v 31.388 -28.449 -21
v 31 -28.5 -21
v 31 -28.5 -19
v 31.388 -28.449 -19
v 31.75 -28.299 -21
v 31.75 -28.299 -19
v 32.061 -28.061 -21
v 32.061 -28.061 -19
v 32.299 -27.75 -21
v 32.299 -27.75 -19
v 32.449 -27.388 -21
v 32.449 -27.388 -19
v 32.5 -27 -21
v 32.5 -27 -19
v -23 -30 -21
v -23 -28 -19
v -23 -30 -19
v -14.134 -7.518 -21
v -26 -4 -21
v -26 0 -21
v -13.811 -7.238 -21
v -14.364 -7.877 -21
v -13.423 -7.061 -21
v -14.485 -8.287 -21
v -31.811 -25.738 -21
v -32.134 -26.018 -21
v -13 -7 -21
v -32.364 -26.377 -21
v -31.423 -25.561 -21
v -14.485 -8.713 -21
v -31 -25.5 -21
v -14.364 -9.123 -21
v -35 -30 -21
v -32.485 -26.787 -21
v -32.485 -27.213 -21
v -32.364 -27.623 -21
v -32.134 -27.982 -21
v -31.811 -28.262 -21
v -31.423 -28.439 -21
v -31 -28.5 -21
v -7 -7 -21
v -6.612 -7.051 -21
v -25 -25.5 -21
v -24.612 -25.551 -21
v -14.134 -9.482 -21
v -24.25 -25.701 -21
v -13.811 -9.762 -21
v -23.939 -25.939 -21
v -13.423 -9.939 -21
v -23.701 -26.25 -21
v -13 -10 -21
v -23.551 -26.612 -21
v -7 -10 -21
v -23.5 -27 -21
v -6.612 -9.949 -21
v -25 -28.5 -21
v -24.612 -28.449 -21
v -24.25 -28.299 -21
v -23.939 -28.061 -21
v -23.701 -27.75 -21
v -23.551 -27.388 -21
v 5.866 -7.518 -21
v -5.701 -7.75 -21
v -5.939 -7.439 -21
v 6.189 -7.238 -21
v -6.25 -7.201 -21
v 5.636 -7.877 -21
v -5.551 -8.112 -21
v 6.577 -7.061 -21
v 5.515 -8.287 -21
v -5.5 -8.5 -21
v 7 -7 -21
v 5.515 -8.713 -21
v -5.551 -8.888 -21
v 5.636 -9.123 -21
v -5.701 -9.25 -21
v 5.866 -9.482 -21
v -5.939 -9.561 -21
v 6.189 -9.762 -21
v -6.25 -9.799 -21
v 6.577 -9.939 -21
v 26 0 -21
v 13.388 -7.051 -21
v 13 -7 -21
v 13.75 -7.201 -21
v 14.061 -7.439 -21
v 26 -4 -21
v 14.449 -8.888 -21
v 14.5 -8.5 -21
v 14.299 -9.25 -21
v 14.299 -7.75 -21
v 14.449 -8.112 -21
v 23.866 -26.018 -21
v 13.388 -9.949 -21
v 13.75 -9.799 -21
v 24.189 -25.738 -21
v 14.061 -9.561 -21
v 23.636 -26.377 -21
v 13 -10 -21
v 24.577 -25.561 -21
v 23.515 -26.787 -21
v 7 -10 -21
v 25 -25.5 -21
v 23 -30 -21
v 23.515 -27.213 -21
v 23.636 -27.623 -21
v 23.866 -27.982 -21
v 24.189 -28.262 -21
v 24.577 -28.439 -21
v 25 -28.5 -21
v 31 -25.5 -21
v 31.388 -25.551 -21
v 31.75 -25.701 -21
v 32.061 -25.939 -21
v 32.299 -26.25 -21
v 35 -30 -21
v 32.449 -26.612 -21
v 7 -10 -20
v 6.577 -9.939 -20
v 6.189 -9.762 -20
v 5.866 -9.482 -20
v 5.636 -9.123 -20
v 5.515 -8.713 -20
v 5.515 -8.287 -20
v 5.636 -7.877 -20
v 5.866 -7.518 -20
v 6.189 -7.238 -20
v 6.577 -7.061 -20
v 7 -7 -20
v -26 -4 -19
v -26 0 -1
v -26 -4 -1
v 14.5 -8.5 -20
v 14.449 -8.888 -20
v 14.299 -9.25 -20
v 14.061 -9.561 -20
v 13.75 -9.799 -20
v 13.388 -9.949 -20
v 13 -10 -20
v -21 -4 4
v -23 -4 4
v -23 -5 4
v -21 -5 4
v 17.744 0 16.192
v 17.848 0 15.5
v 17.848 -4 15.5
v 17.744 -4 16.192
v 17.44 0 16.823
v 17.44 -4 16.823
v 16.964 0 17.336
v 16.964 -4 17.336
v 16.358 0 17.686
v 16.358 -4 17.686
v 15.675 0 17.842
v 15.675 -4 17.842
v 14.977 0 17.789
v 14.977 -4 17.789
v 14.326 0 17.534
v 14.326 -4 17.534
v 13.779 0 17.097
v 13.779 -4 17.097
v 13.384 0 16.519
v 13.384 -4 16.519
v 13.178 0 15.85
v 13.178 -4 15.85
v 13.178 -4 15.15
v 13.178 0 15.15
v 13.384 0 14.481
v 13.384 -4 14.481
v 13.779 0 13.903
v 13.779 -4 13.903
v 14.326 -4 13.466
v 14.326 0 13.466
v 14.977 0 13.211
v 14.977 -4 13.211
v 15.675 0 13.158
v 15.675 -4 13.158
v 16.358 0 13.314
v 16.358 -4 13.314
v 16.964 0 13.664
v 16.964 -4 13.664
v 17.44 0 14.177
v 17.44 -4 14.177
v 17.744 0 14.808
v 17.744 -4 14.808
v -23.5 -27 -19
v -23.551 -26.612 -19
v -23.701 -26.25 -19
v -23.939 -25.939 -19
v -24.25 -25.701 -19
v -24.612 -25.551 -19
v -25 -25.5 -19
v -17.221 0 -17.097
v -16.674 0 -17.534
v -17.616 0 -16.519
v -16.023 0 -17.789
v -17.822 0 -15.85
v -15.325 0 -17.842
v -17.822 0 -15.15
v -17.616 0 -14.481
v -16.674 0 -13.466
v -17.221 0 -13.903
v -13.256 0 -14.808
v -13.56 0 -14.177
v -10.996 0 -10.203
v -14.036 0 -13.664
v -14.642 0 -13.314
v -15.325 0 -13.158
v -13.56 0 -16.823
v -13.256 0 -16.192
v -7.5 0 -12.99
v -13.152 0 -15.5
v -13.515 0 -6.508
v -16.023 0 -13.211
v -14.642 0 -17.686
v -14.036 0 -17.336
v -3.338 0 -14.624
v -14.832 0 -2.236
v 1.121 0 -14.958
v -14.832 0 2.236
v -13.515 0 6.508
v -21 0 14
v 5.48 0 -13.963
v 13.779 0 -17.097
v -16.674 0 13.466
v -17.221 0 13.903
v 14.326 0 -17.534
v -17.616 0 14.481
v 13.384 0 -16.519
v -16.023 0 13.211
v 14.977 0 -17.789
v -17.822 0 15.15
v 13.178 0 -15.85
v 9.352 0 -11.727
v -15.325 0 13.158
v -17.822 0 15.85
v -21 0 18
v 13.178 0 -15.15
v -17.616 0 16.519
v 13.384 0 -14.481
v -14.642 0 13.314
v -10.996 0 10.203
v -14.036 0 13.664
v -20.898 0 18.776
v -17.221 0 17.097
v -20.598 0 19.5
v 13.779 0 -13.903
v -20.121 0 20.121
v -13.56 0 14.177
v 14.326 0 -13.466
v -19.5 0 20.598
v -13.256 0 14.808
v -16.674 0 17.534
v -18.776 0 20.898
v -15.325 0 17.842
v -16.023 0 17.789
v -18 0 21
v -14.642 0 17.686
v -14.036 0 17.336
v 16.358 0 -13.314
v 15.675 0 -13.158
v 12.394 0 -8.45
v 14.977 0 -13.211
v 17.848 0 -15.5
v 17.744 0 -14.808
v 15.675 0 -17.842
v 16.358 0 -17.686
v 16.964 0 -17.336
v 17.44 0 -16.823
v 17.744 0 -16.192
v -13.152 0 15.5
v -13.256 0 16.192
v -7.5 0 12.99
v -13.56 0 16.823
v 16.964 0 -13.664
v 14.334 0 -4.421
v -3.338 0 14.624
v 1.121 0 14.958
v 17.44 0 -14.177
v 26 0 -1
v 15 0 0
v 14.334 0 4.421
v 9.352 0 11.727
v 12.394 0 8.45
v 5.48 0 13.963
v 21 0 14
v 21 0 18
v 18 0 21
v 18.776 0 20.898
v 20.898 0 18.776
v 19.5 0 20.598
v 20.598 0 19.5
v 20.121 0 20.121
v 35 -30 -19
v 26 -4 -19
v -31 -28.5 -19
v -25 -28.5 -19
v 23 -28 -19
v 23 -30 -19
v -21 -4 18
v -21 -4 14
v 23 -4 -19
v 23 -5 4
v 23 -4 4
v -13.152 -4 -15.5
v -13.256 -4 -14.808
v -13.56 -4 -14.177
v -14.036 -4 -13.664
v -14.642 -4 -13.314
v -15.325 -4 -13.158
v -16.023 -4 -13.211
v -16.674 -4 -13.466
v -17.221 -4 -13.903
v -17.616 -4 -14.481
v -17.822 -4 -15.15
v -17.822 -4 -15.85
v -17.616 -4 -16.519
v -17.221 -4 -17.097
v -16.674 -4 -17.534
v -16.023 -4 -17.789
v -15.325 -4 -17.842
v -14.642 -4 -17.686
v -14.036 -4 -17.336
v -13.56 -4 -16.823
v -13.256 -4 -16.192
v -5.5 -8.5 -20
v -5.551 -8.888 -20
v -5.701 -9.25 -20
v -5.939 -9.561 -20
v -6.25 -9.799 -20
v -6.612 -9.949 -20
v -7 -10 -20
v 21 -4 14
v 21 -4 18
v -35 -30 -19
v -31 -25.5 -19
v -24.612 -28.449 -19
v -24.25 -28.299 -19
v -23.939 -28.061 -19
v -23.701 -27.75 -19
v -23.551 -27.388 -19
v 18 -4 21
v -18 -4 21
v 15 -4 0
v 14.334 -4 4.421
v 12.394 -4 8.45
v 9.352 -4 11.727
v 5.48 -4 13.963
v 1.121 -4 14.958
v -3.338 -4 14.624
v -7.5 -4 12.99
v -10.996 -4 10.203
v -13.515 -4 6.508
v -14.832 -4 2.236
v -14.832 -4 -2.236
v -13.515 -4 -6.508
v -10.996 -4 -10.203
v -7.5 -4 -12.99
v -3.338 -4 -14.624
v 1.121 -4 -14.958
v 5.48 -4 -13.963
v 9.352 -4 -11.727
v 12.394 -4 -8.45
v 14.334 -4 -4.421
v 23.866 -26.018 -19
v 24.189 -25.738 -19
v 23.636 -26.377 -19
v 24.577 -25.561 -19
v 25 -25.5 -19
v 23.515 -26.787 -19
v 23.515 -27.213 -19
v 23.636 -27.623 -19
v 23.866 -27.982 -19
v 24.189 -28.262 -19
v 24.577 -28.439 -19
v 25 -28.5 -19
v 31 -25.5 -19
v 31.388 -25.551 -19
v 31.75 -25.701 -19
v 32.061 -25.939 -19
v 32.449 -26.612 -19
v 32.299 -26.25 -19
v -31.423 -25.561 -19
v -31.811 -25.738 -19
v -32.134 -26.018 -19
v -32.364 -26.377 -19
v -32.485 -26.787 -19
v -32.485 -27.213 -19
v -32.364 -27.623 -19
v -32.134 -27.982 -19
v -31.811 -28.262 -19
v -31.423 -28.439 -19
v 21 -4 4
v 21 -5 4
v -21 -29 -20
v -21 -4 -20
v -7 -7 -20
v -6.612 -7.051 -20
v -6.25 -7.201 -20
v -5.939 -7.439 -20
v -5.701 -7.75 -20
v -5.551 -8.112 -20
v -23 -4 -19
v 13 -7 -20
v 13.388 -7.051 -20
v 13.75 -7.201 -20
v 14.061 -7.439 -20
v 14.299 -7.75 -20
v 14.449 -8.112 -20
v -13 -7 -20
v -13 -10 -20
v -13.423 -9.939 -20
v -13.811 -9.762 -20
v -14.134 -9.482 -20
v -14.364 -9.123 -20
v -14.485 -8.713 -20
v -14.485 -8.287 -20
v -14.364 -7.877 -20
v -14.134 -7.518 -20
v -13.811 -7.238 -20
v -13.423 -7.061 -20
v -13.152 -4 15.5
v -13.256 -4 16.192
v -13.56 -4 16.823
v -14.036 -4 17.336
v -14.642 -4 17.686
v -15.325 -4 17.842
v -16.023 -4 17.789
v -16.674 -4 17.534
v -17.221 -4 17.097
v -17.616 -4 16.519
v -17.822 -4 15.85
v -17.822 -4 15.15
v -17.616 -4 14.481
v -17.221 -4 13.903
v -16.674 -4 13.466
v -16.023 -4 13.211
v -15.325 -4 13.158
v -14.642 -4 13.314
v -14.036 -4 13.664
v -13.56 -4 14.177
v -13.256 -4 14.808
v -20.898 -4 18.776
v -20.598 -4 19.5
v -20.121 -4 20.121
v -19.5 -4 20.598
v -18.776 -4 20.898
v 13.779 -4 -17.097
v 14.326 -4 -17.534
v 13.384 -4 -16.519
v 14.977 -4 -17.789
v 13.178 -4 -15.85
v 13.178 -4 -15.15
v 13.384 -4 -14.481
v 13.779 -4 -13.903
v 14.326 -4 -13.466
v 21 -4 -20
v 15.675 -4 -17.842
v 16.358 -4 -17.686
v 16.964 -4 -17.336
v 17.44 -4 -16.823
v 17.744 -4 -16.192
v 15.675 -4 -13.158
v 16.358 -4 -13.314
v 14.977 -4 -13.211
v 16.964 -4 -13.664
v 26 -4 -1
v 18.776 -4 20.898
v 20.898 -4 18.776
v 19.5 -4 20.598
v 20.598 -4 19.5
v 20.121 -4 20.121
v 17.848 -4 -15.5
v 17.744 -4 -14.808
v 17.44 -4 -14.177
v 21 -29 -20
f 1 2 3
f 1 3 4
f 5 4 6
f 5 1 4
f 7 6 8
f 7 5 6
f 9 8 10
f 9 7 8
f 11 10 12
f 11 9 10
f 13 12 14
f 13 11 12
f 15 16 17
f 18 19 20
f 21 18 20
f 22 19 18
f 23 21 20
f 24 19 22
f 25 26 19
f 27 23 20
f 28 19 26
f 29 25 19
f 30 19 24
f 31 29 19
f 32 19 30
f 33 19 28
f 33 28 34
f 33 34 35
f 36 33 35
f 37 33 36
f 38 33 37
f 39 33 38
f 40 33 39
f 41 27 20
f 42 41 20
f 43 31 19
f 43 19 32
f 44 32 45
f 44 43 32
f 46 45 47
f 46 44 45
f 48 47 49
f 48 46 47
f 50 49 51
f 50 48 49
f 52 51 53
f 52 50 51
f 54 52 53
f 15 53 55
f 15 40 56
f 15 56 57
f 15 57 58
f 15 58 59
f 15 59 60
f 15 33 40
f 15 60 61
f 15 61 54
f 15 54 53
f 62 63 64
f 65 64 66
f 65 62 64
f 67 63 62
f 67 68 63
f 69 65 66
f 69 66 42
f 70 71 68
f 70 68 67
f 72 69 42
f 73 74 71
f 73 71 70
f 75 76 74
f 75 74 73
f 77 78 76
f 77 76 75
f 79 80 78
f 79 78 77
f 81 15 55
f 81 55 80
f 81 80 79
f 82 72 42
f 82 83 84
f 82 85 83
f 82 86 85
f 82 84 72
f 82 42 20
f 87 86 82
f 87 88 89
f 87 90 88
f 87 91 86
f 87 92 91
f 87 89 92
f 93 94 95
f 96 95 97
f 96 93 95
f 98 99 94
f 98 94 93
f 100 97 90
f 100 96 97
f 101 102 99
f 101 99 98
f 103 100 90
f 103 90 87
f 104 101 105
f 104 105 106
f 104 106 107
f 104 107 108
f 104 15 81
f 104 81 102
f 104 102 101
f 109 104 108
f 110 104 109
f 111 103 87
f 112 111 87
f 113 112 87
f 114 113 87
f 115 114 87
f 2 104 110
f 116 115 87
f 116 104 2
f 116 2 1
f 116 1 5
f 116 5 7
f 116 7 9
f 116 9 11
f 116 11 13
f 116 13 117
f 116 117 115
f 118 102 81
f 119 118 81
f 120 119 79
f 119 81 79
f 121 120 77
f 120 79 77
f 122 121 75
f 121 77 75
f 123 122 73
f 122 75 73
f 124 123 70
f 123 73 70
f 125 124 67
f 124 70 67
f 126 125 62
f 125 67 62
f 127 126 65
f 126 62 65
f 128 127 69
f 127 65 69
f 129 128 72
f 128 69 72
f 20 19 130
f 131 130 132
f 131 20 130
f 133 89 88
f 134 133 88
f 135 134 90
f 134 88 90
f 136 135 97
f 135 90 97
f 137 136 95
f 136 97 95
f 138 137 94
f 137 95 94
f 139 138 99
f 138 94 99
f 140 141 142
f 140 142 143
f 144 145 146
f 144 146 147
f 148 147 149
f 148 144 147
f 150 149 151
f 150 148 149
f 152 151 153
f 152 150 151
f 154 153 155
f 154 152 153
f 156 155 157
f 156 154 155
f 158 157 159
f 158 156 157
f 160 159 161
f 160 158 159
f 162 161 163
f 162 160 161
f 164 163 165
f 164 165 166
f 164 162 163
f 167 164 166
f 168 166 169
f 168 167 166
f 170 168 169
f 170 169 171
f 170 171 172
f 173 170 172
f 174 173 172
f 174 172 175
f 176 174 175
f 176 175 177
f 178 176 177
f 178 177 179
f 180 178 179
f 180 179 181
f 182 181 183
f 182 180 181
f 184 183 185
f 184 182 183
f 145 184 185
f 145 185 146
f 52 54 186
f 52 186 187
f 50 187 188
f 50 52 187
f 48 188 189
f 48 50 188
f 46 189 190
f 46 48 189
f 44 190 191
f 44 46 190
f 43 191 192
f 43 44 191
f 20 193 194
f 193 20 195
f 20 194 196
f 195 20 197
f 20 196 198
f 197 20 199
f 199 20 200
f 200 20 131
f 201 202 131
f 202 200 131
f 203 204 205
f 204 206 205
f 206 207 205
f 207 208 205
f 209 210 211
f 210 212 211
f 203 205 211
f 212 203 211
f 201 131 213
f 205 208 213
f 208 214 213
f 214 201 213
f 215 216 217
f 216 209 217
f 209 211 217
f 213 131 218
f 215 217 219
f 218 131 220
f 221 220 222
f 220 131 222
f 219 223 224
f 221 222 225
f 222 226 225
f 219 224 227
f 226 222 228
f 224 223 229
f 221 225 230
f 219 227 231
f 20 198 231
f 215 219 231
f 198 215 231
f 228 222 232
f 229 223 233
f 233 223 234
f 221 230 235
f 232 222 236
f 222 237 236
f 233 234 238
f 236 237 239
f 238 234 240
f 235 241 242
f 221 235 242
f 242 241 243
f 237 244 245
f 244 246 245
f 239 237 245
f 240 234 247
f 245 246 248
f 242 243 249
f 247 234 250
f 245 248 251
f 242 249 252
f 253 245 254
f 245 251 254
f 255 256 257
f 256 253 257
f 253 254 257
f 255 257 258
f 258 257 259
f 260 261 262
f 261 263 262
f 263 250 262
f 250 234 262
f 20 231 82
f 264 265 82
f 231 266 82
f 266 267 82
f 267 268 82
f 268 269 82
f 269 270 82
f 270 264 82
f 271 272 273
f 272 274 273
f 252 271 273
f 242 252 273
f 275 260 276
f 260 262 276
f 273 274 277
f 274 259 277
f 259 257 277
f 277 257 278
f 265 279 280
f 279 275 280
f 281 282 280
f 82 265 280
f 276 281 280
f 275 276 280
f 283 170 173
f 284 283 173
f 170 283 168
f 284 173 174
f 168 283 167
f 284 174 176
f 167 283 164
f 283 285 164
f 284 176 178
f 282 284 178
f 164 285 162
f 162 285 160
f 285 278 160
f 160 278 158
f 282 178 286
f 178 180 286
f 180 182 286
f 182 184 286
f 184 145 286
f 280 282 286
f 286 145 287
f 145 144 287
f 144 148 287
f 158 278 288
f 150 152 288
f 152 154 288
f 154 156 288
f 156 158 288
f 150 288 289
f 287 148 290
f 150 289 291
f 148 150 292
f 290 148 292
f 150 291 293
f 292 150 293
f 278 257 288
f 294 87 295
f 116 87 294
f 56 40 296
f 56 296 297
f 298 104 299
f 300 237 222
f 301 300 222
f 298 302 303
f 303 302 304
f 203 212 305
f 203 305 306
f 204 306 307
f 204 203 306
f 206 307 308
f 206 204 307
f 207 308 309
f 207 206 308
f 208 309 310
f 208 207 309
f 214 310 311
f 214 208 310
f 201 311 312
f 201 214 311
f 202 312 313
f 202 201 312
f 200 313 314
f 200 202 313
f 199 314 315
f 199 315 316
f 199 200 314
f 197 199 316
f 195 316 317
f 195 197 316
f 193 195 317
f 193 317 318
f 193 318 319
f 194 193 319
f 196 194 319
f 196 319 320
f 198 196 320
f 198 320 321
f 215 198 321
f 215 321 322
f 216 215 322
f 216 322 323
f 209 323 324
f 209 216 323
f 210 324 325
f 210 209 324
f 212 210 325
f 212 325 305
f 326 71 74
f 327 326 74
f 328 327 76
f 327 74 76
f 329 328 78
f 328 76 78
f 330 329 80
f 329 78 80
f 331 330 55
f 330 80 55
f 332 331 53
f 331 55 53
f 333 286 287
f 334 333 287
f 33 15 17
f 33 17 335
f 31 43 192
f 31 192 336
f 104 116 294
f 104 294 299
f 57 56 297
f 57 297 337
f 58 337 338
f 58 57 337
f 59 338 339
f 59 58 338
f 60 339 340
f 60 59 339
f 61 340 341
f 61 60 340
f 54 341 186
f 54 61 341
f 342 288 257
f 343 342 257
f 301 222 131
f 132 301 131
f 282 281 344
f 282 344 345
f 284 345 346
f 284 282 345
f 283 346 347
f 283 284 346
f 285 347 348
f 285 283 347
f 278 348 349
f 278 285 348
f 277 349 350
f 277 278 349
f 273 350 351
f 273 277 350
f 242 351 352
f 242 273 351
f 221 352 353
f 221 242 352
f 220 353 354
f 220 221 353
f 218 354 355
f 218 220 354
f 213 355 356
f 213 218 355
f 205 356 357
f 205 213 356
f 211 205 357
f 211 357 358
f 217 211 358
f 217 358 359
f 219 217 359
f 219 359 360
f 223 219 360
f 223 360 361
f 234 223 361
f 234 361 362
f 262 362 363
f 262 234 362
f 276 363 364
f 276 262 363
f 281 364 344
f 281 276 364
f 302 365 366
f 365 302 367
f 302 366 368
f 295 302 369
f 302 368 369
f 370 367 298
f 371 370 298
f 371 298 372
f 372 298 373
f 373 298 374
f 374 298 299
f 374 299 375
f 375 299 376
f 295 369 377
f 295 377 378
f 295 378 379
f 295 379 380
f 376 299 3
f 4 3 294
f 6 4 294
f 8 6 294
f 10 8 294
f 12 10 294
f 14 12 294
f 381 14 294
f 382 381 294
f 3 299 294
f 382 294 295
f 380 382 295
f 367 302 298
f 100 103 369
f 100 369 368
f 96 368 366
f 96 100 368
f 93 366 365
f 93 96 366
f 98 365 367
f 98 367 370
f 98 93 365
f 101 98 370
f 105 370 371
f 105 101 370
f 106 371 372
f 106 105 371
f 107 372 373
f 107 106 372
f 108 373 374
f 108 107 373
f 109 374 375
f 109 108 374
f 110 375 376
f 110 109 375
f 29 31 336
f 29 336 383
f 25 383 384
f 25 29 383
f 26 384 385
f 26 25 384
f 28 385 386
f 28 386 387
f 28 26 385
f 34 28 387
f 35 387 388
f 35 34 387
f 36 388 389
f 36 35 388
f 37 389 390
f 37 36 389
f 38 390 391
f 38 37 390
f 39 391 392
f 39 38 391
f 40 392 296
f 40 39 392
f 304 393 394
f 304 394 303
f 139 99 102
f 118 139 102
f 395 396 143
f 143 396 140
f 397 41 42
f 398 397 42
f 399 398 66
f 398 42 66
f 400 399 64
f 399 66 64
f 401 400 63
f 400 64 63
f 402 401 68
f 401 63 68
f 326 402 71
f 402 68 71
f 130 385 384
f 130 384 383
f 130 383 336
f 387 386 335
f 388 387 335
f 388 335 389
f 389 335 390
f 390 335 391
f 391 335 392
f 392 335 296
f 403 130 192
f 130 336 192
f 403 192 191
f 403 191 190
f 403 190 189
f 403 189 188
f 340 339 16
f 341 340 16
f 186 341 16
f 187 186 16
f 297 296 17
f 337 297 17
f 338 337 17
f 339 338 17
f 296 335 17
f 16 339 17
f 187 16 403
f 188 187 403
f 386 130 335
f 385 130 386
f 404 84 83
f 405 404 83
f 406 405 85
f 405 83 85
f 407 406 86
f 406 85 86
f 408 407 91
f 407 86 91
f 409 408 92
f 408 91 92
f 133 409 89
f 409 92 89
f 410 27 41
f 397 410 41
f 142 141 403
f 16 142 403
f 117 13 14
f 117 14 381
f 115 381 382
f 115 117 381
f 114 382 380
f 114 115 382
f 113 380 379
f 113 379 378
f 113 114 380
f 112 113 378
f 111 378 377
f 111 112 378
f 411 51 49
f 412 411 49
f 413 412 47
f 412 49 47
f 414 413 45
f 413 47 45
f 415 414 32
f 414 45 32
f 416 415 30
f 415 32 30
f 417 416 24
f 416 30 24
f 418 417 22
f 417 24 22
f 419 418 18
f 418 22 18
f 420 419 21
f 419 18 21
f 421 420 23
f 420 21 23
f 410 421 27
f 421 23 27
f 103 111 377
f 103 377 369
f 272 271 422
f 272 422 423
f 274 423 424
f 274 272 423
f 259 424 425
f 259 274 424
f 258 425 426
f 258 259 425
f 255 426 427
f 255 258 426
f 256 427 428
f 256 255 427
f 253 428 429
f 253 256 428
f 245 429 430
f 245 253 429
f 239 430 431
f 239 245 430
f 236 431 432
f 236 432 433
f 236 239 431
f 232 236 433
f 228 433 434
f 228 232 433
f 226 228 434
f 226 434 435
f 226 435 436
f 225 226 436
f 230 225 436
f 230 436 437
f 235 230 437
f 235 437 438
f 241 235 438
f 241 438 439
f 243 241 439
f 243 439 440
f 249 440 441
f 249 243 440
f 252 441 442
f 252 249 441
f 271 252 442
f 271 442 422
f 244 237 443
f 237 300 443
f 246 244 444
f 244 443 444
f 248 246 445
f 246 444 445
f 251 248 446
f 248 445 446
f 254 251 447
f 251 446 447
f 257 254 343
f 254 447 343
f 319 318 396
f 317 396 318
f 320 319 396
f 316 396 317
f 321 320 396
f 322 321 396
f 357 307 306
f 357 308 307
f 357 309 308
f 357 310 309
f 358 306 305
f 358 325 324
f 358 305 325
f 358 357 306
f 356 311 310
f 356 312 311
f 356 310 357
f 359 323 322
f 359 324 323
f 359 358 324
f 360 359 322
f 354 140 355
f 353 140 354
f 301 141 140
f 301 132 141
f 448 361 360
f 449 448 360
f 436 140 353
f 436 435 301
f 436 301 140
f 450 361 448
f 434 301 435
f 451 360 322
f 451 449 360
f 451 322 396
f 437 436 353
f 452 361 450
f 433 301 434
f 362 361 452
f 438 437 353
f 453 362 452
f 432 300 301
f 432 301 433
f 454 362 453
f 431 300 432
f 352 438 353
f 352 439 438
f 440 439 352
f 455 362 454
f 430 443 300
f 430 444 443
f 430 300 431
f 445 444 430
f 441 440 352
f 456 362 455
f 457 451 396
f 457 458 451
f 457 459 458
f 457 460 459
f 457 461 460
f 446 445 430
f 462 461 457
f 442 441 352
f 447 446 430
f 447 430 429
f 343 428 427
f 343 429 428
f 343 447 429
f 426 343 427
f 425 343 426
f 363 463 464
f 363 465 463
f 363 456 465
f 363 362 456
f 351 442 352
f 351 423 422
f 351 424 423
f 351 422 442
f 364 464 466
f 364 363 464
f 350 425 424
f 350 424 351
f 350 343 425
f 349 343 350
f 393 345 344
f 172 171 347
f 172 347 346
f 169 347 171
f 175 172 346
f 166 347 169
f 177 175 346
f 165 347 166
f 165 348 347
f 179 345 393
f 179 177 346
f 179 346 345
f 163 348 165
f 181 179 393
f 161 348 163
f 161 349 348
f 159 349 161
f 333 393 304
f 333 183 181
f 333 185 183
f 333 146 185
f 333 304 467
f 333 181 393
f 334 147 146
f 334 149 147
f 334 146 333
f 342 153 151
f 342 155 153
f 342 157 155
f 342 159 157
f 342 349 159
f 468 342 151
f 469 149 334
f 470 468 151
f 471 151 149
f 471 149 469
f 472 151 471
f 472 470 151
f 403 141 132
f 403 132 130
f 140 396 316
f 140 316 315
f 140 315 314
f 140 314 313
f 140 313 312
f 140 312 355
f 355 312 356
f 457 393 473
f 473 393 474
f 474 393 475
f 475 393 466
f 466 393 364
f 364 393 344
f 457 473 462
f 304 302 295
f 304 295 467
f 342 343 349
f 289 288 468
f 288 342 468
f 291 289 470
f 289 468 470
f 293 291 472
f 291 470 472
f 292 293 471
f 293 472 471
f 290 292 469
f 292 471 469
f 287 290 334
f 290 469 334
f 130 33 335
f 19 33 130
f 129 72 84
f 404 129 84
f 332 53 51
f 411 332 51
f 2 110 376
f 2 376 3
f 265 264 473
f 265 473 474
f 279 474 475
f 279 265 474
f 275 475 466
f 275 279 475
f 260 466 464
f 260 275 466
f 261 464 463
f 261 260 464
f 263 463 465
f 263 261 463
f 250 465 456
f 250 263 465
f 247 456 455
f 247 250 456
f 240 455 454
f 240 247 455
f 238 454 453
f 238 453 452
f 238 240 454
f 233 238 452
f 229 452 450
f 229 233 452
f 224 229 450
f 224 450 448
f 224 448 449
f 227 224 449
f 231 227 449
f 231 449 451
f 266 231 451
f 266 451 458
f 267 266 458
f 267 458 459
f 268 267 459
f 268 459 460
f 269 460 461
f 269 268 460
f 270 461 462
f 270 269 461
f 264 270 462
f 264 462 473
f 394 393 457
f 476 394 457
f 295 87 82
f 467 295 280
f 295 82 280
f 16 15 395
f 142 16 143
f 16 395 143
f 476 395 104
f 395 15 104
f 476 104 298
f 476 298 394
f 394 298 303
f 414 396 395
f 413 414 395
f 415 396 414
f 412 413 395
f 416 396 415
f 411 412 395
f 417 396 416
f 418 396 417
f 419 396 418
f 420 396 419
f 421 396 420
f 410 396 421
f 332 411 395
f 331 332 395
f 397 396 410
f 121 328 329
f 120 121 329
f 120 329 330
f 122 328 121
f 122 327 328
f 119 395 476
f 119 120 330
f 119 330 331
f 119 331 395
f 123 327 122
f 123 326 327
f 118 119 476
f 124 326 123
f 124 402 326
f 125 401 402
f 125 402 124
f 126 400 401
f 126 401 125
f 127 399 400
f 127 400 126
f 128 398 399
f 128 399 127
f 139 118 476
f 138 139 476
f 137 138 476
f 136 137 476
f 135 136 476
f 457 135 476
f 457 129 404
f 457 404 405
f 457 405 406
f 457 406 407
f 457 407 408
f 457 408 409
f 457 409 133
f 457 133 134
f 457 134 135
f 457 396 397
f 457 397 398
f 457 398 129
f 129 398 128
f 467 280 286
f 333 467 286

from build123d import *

# Parameters (mm, degrees)
F0_R     = 2.348250802
F0_R_2   = 15
F0_W     = 3
F0_H     = 20
F0_W_2   = 42
F0_H_2   = 1
F1_DEPTH = 4
F0_W_3   = 2
F0_H_3   = 5
F2_DEPTH = 30
F4_DEPTH = 49.001
F6_DEPTH = 2
F7_DEPTH = 25
F8_R     = 3


with BuildPart() as f1:
    # F0 (on Front) → F1 (new body)
    with BuildSketch(Plane.XZ):
        Polygon((21, 14), (21, 21), (-21, 21), (-21, 14), (-21, 4), (-21, -1), (-21, -20), (21, -20), (21, -1), (21, 4), align=None)
        with Locations((-15.5, -15.5)):
            Circle(F0_R, mode=Mode.SUBTRACT)
        with Locations((15.5, -15.5)):
            Circle(F0_R, mode=Mode.SUBTRACT)
        with Locations((-15.5, 15.5)):
            Circle(F0_R, mode=Mode.SUBTRACT)
        Circle(F0_R_2, mode=Mode.SUBTRACT)
        with Locations((15.5, 15.5)):
            Circle(F0_R, mode=Mode.SUBTRACT)
        Polygon((26, -1), (21, 14), (21, 4), (23, 4), (23, -1), align=None)
        Polygon((-21, 4), (-21, 14), (-26, -1), (-23, -1), (-23, 4), align=None)
        with Locations((24.5, -11)):
            Rectangle(F0_W, F0_H)
        with Locations((-24.5, -11)):
            Rectangle(F0_W, F0_H)
        with Locations((0, -20.5)):
            Rectangle(F0_W_2, F0_H_2)
    extrude(amount=F1_DEPTH)

    # F0 (on Front) → F2 (join)
    with BuildSketch(Plane.XZ):
        with Locations((22, 1.5)):
            Rectangle(F0_W_3, F0_H_3)
        Polygon((23, -1), (21, -1), (21, -20), (21, -21), (23, -21), align=None)
        with Locations((-22, 1.5)):
            Rectangle(F0_W_3, F0_H_3)
        Polygon((-21, -20), (-21, -1), (-23, -1), (-23, -21), (-21, -21), align=None)
        with Locations((0, -20.5)):
            Rectangle(F0_W_2, F0_H_2)
    extrude(amount=F2_DEPTH)

    # F3 (on face) → F4 (cut, through all)
    with BuildSketch(Plane.YZ.offset(23)):
        Polygon((-30, -21), (-5, 4), (-30, 4), align=None)
    extrude(amount=-F4_DEPTH, mode=Mode.SUBTRACT)

    # F5 (on face) → F6 (join)
    with BuildSketch(Plane(origin=(0, 0, -21), x_dir=(1, 0, 0), z_dir=(0, 0, -1))):
        Polygon((-23, 4), (-23, 30), (-35, 30), (-26, 4), align=None)
        with BuildLine():
            ThreePointArc((-25, 28.5), (-23.9393398282, 28.0606601718), (-23.5, 27))
            ThreePointArc((-23.5, 27), (-23.9393398282, 25.9393398282), (-25, 25.5))
            Line((-25, 25.5), (-31, 25.5))
            ThreePointArc((-31, 25.5), (-32.5, 27), (-31, 28.5))
            Line((-31, 28.5), (-25, 28.5))
        make_face(mode=Mode.SUBTRACT)
        Polygon((23, 4), (26, 4), (35, 30), (23, 30), align=None)
        with BuildLine():
            ThreePointArc((25, 25.5), (23.5, 27), (25, 28.5))
            Line((25, 28.5), (31, 28.5))
            ThreePointArc((31, 28.5), (32.0606601718, 28.0606601718), (32.5, 27))
            ThreePointArc((32.5, 27), (32.0606601718, 25.9393398282), (31, 25.5))
            Line((31, 25.5), (25, 25.5))
        make_face(mode=Mode.SUBTRACT)
    extrude(amount=-F6_DEPTH)

    # F5 (on face) → F7 (cut)
    with BuildSketch(Plane(origin=(0, 0, -21), x_dir=(1, 0, 0), z_dir=(0, 0, -1))):
        with BuildLine():
            ThreePointArc((-7, 7), (-8.5, 8.5), (-7, 10))
            Line((-7, 10), (-13, 10))
            ThreePointArc((-13, 10), (-11.9393398282, 9.5606601718), (-11.5, 8.5))
            ThreePointArc((-11.5, 8.5), (-11.9393398282, 7.4393398282), (-13, 7))
            Line((-13, 7), (-7, 7))
        make_face()
        with BuildLine():
            ThreePointArc((-11.5, 8.5), (-11.9393398282, 9.5606601718), (-13, 10))
            ThreePointArc((-13, 10), (-14.5, 8.5), (-13, 7))
            ThreePointArc((-13, 7), (-11.9393398282, 7.4393398282), (-11.5, 8.5))
        make_face()
        with BuildLine():
            ThreePointArc((-7, 7), (-5.9393398282, 7.4393398282), (-5.5, 8.5))
            ThreePointArc((-5.5, 8.5), (-5.9393398282, 9.5606601718), (-7, 10))
            ThreePointArc((-7, 10), (-8.5, 8.5), (-7, 7))
        make_face()
        with BuildLine():
            Line((13, 10), (7, 10))
            ThreePointArc((7, 10), (8.0606601718, 9.5606601718), (8.5, 8.5))
            ThreePointArc((8.5, 8.5), (8.0606601718, 7.4393398282), (7, 7))
            Line((7, 7), (13, 7))
            ThreePointArc((13, 7), (11.5, 8.5), (13, 10))
        make_face()
        with BuildLine():
            ThreePointArc((14.5, 8.5), (14.0606601718, 9.5606601718), (13, 10))
            ThreePointArc((13, 10), (11.5, 8.5), (13, 7))
            ThreePointArc((13, 7), (14.0606601718, 7.4393398282), (14.5, 8.5))
        make_face()
        with BuildLine():
            ThreePointArc((8.5, 8.5), (8.0606601718, 9.5606601718), (7, 10))
            ThreePointArc((7, 10), (5.5, 8.5), (7, 7))
            ThreePointArc((7, 7), (8.0606601718, 7.4393398282), (8.5, 8.5))
        make_face()
    extrude(amount=-F7_DEPTH, mode=Mode.SUBTRACT)

    # F8
    f8_edges = [f1.edges().sort_by_distance(p)[0] for p in [
        (21, -2, 21),
        (-21, -2, 21),
    ]]
    fillet(f8_edges, radius=F8_R)


solid = f1.part
